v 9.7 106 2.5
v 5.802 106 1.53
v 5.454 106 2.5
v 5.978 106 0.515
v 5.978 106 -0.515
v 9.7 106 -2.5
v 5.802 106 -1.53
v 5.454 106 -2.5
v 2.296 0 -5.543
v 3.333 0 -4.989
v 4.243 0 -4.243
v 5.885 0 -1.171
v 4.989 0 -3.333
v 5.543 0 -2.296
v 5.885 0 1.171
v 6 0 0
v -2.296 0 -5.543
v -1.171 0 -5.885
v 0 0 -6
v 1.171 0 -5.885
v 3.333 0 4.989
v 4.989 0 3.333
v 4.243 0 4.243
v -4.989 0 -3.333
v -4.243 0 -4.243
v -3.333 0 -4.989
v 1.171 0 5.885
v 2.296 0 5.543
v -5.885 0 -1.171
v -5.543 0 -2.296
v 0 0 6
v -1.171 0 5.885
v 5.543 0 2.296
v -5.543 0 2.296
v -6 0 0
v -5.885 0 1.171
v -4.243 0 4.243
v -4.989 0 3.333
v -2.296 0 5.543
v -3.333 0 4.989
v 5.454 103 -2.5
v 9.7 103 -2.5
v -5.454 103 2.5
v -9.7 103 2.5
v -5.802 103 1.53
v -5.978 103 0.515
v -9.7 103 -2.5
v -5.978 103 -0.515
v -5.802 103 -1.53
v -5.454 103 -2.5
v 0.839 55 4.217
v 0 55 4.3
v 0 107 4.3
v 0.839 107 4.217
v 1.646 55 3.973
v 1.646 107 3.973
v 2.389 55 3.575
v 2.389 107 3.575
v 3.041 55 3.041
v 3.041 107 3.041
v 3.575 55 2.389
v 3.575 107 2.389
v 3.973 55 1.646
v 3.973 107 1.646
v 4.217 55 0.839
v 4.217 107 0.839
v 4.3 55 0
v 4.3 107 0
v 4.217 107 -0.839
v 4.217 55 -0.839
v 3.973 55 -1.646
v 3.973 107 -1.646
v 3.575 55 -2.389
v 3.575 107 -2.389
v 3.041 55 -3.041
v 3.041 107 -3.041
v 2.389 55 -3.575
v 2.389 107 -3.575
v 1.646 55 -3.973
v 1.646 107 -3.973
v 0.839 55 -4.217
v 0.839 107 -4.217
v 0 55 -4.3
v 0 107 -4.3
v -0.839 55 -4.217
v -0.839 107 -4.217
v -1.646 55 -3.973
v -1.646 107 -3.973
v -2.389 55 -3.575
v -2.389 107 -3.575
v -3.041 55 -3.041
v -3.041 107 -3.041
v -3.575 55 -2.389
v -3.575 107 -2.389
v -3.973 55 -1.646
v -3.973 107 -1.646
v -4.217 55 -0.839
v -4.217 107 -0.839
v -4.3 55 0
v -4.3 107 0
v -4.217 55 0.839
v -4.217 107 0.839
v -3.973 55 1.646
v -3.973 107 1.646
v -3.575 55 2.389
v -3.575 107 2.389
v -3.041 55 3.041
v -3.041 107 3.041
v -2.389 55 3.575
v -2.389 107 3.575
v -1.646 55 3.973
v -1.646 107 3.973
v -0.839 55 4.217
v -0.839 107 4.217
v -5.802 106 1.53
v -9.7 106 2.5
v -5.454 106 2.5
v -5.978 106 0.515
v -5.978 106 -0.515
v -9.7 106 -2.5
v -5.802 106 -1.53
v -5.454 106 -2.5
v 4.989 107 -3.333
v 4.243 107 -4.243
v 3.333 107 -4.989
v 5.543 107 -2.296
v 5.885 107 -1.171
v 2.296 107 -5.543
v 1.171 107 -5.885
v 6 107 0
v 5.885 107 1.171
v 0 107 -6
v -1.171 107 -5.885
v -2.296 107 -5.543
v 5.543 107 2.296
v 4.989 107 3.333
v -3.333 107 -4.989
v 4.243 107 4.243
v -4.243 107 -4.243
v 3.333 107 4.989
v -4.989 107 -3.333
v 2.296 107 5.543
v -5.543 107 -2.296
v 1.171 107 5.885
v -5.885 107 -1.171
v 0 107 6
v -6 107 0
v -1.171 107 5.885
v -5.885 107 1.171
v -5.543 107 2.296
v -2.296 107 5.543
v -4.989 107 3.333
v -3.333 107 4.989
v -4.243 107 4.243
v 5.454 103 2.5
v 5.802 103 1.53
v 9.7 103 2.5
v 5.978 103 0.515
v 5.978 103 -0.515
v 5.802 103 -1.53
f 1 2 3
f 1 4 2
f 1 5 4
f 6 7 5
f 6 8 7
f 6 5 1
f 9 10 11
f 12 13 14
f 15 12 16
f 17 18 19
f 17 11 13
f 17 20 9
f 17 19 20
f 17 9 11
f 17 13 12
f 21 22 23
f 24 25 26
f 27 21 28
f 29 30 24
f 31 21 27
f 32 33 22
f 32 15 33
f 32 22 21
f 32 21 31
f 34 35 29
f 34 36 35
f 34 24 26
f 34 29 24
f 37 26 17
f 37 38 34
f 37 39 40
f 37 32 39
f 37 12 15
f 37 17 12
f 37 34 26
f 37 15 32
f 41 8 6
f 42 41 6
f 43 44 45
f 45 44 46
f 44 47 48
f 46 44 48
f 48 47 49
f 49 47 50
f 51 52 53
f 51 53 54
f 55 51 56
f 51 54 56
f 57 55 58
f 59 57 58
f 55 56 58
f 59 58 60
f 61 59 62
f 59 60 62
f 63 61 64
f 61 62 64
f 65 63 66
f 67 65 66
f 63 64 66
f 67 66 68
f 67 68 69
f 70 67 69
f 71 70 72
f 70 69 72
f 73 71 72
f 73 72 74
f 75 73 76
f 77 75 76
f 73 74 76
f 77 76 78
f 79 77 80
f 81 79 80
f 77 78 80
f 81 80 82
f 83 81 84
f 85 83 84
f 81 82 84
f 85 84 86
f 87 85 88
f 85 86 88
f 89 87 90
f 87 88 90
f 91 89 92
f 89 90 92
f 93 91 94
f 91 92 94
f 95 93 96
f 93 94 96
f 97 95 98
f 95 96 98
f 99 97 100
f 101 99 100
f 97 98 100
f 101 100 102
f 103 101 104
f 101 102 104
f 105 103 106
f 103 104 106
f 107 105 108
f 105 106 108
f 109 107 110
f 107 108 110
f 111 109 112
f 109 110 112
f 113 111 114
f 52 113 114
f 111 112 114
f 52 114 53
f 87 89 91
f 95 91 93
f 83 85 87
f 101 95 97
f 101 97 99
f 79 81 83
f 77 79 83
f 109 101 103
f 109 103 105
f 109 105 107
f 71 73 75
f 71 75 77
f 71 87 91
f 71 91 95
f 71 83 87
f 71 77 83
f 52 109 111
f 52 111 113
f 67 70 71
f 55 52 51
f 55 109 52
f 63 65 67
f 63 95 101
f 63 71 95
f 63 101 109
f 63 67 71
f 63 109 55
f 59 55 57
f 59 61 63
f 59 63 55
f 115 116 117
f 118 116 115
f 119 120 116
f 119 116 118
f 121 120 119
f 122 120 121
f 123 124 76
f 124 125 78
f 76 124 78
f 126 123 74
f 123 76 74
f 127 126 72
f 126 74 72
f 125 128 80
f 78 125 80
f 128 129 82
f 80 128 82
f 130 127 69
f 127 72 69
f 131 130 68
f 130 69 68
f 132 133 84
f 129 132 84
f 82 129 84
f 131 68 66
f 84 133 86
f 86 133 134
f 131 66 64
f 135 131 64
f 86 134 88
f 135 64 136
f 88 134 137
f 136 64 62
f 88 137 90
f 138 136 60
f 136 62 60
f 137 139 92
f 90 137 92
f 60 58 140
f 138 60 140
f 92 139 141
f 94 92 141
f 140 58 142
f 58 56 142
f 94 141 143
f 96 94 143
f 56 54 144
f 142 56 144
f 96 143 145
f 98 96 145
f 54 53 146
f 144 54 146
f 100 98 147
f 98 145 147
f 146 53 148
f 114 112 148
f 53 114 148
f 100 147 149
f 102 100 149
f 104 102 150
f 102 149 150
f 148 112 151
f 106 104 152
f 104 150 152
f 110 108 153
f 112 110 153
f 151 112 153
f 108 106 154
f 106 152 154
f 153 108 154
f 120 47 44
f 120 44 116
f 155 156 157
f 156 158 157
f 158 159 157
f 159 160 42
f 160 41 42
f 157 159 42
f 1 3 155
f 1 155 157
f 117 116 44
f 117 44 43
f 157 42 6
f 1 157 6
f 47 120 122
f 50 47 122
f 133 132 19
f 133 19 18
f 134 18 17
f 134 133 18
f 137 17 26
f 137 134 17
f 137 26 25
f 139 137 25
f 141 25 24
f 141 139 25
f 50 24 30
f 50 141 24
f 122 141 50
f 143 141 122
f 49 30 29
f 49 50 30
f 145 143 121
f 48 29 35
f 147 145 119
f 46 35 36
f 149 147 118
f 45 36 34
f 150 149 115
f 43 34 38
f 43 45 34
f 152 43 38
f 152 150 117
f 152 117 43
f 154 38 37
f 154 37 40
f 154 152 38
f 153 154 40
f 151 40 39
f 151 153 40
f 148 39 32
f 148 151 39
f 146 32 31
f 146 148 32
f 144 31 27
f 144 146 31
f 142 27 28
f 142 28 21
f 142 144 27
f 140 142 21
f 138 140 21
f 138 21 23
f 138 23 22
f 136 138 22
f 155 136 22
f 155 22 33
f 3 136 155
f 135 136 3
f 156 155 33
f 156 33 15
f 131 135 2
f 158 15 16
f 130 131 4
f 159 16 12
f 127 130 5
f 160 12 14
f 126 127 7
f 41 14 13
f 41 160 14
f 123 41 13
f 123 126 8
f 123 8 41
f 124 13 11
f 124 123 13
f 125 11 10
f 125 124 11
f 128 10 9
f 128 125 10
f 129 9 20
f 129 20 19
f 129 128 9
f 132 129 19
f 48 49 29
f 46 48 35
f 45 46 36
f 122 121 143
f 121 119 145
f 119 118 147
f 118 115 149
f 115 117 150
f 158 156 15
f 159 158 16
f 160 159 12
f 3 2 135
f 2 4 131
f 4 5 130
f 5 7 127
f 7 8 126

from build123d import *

# Parameters (mm, degrees)
SKETCH_1_W                = 6
SKETCH_1_H                = 107
SKETCH_3_W                = 19.4
SKETCH_3_H                = 3
INTERNAL_OUTPUT_KEY_DEPTH = 5
SKETCH_4_R                = 4.3
SCREW_CLEARANCE_DEPTH     = 52


with BuildPart() as part:
    # 草图1 → Output_tube (revolve)
    with BuildSketch(Plane.XY, mode=Mode.PRIVATE) as output_tube_sk:
        with Locations((3, 53.5)):
            Rectangle(SKETCH_1_W, SKETCH_1_H)
    revolve(output_tube_sk.sketch.rotate(Axis((0, 0, 0), (0, 1, 0)), 90), axis=Axis((0, 0, 0), (0, 1, 0)))

    # 草图3 → Internal_output_key (add)
    with BuildSketch(Plane.XY.offset(-2.5)):
        with Locations((0, 104.5)):
            Rectangle(SKETCH_3_W, SKETCH_3_H)
    extrude(amount=INTERNAL_OUTPUT_KEY_DEPTH)

    # 草图4 → Screw_clearance (cut)
    with BuildSketch(Plane(origin=(0, 107, 0), x_dir=(1, 0, 0), z_dir=(0, 1, 0))):
        with Locations(Location((0, 0, 0), (0, 0, 270))):
            Circle(SKETCH_4_R)
    extrude(amount=-SCREW_CLEARANCE_DEPTH, mode=Mode.SUBTRACT)


solid = part.part
